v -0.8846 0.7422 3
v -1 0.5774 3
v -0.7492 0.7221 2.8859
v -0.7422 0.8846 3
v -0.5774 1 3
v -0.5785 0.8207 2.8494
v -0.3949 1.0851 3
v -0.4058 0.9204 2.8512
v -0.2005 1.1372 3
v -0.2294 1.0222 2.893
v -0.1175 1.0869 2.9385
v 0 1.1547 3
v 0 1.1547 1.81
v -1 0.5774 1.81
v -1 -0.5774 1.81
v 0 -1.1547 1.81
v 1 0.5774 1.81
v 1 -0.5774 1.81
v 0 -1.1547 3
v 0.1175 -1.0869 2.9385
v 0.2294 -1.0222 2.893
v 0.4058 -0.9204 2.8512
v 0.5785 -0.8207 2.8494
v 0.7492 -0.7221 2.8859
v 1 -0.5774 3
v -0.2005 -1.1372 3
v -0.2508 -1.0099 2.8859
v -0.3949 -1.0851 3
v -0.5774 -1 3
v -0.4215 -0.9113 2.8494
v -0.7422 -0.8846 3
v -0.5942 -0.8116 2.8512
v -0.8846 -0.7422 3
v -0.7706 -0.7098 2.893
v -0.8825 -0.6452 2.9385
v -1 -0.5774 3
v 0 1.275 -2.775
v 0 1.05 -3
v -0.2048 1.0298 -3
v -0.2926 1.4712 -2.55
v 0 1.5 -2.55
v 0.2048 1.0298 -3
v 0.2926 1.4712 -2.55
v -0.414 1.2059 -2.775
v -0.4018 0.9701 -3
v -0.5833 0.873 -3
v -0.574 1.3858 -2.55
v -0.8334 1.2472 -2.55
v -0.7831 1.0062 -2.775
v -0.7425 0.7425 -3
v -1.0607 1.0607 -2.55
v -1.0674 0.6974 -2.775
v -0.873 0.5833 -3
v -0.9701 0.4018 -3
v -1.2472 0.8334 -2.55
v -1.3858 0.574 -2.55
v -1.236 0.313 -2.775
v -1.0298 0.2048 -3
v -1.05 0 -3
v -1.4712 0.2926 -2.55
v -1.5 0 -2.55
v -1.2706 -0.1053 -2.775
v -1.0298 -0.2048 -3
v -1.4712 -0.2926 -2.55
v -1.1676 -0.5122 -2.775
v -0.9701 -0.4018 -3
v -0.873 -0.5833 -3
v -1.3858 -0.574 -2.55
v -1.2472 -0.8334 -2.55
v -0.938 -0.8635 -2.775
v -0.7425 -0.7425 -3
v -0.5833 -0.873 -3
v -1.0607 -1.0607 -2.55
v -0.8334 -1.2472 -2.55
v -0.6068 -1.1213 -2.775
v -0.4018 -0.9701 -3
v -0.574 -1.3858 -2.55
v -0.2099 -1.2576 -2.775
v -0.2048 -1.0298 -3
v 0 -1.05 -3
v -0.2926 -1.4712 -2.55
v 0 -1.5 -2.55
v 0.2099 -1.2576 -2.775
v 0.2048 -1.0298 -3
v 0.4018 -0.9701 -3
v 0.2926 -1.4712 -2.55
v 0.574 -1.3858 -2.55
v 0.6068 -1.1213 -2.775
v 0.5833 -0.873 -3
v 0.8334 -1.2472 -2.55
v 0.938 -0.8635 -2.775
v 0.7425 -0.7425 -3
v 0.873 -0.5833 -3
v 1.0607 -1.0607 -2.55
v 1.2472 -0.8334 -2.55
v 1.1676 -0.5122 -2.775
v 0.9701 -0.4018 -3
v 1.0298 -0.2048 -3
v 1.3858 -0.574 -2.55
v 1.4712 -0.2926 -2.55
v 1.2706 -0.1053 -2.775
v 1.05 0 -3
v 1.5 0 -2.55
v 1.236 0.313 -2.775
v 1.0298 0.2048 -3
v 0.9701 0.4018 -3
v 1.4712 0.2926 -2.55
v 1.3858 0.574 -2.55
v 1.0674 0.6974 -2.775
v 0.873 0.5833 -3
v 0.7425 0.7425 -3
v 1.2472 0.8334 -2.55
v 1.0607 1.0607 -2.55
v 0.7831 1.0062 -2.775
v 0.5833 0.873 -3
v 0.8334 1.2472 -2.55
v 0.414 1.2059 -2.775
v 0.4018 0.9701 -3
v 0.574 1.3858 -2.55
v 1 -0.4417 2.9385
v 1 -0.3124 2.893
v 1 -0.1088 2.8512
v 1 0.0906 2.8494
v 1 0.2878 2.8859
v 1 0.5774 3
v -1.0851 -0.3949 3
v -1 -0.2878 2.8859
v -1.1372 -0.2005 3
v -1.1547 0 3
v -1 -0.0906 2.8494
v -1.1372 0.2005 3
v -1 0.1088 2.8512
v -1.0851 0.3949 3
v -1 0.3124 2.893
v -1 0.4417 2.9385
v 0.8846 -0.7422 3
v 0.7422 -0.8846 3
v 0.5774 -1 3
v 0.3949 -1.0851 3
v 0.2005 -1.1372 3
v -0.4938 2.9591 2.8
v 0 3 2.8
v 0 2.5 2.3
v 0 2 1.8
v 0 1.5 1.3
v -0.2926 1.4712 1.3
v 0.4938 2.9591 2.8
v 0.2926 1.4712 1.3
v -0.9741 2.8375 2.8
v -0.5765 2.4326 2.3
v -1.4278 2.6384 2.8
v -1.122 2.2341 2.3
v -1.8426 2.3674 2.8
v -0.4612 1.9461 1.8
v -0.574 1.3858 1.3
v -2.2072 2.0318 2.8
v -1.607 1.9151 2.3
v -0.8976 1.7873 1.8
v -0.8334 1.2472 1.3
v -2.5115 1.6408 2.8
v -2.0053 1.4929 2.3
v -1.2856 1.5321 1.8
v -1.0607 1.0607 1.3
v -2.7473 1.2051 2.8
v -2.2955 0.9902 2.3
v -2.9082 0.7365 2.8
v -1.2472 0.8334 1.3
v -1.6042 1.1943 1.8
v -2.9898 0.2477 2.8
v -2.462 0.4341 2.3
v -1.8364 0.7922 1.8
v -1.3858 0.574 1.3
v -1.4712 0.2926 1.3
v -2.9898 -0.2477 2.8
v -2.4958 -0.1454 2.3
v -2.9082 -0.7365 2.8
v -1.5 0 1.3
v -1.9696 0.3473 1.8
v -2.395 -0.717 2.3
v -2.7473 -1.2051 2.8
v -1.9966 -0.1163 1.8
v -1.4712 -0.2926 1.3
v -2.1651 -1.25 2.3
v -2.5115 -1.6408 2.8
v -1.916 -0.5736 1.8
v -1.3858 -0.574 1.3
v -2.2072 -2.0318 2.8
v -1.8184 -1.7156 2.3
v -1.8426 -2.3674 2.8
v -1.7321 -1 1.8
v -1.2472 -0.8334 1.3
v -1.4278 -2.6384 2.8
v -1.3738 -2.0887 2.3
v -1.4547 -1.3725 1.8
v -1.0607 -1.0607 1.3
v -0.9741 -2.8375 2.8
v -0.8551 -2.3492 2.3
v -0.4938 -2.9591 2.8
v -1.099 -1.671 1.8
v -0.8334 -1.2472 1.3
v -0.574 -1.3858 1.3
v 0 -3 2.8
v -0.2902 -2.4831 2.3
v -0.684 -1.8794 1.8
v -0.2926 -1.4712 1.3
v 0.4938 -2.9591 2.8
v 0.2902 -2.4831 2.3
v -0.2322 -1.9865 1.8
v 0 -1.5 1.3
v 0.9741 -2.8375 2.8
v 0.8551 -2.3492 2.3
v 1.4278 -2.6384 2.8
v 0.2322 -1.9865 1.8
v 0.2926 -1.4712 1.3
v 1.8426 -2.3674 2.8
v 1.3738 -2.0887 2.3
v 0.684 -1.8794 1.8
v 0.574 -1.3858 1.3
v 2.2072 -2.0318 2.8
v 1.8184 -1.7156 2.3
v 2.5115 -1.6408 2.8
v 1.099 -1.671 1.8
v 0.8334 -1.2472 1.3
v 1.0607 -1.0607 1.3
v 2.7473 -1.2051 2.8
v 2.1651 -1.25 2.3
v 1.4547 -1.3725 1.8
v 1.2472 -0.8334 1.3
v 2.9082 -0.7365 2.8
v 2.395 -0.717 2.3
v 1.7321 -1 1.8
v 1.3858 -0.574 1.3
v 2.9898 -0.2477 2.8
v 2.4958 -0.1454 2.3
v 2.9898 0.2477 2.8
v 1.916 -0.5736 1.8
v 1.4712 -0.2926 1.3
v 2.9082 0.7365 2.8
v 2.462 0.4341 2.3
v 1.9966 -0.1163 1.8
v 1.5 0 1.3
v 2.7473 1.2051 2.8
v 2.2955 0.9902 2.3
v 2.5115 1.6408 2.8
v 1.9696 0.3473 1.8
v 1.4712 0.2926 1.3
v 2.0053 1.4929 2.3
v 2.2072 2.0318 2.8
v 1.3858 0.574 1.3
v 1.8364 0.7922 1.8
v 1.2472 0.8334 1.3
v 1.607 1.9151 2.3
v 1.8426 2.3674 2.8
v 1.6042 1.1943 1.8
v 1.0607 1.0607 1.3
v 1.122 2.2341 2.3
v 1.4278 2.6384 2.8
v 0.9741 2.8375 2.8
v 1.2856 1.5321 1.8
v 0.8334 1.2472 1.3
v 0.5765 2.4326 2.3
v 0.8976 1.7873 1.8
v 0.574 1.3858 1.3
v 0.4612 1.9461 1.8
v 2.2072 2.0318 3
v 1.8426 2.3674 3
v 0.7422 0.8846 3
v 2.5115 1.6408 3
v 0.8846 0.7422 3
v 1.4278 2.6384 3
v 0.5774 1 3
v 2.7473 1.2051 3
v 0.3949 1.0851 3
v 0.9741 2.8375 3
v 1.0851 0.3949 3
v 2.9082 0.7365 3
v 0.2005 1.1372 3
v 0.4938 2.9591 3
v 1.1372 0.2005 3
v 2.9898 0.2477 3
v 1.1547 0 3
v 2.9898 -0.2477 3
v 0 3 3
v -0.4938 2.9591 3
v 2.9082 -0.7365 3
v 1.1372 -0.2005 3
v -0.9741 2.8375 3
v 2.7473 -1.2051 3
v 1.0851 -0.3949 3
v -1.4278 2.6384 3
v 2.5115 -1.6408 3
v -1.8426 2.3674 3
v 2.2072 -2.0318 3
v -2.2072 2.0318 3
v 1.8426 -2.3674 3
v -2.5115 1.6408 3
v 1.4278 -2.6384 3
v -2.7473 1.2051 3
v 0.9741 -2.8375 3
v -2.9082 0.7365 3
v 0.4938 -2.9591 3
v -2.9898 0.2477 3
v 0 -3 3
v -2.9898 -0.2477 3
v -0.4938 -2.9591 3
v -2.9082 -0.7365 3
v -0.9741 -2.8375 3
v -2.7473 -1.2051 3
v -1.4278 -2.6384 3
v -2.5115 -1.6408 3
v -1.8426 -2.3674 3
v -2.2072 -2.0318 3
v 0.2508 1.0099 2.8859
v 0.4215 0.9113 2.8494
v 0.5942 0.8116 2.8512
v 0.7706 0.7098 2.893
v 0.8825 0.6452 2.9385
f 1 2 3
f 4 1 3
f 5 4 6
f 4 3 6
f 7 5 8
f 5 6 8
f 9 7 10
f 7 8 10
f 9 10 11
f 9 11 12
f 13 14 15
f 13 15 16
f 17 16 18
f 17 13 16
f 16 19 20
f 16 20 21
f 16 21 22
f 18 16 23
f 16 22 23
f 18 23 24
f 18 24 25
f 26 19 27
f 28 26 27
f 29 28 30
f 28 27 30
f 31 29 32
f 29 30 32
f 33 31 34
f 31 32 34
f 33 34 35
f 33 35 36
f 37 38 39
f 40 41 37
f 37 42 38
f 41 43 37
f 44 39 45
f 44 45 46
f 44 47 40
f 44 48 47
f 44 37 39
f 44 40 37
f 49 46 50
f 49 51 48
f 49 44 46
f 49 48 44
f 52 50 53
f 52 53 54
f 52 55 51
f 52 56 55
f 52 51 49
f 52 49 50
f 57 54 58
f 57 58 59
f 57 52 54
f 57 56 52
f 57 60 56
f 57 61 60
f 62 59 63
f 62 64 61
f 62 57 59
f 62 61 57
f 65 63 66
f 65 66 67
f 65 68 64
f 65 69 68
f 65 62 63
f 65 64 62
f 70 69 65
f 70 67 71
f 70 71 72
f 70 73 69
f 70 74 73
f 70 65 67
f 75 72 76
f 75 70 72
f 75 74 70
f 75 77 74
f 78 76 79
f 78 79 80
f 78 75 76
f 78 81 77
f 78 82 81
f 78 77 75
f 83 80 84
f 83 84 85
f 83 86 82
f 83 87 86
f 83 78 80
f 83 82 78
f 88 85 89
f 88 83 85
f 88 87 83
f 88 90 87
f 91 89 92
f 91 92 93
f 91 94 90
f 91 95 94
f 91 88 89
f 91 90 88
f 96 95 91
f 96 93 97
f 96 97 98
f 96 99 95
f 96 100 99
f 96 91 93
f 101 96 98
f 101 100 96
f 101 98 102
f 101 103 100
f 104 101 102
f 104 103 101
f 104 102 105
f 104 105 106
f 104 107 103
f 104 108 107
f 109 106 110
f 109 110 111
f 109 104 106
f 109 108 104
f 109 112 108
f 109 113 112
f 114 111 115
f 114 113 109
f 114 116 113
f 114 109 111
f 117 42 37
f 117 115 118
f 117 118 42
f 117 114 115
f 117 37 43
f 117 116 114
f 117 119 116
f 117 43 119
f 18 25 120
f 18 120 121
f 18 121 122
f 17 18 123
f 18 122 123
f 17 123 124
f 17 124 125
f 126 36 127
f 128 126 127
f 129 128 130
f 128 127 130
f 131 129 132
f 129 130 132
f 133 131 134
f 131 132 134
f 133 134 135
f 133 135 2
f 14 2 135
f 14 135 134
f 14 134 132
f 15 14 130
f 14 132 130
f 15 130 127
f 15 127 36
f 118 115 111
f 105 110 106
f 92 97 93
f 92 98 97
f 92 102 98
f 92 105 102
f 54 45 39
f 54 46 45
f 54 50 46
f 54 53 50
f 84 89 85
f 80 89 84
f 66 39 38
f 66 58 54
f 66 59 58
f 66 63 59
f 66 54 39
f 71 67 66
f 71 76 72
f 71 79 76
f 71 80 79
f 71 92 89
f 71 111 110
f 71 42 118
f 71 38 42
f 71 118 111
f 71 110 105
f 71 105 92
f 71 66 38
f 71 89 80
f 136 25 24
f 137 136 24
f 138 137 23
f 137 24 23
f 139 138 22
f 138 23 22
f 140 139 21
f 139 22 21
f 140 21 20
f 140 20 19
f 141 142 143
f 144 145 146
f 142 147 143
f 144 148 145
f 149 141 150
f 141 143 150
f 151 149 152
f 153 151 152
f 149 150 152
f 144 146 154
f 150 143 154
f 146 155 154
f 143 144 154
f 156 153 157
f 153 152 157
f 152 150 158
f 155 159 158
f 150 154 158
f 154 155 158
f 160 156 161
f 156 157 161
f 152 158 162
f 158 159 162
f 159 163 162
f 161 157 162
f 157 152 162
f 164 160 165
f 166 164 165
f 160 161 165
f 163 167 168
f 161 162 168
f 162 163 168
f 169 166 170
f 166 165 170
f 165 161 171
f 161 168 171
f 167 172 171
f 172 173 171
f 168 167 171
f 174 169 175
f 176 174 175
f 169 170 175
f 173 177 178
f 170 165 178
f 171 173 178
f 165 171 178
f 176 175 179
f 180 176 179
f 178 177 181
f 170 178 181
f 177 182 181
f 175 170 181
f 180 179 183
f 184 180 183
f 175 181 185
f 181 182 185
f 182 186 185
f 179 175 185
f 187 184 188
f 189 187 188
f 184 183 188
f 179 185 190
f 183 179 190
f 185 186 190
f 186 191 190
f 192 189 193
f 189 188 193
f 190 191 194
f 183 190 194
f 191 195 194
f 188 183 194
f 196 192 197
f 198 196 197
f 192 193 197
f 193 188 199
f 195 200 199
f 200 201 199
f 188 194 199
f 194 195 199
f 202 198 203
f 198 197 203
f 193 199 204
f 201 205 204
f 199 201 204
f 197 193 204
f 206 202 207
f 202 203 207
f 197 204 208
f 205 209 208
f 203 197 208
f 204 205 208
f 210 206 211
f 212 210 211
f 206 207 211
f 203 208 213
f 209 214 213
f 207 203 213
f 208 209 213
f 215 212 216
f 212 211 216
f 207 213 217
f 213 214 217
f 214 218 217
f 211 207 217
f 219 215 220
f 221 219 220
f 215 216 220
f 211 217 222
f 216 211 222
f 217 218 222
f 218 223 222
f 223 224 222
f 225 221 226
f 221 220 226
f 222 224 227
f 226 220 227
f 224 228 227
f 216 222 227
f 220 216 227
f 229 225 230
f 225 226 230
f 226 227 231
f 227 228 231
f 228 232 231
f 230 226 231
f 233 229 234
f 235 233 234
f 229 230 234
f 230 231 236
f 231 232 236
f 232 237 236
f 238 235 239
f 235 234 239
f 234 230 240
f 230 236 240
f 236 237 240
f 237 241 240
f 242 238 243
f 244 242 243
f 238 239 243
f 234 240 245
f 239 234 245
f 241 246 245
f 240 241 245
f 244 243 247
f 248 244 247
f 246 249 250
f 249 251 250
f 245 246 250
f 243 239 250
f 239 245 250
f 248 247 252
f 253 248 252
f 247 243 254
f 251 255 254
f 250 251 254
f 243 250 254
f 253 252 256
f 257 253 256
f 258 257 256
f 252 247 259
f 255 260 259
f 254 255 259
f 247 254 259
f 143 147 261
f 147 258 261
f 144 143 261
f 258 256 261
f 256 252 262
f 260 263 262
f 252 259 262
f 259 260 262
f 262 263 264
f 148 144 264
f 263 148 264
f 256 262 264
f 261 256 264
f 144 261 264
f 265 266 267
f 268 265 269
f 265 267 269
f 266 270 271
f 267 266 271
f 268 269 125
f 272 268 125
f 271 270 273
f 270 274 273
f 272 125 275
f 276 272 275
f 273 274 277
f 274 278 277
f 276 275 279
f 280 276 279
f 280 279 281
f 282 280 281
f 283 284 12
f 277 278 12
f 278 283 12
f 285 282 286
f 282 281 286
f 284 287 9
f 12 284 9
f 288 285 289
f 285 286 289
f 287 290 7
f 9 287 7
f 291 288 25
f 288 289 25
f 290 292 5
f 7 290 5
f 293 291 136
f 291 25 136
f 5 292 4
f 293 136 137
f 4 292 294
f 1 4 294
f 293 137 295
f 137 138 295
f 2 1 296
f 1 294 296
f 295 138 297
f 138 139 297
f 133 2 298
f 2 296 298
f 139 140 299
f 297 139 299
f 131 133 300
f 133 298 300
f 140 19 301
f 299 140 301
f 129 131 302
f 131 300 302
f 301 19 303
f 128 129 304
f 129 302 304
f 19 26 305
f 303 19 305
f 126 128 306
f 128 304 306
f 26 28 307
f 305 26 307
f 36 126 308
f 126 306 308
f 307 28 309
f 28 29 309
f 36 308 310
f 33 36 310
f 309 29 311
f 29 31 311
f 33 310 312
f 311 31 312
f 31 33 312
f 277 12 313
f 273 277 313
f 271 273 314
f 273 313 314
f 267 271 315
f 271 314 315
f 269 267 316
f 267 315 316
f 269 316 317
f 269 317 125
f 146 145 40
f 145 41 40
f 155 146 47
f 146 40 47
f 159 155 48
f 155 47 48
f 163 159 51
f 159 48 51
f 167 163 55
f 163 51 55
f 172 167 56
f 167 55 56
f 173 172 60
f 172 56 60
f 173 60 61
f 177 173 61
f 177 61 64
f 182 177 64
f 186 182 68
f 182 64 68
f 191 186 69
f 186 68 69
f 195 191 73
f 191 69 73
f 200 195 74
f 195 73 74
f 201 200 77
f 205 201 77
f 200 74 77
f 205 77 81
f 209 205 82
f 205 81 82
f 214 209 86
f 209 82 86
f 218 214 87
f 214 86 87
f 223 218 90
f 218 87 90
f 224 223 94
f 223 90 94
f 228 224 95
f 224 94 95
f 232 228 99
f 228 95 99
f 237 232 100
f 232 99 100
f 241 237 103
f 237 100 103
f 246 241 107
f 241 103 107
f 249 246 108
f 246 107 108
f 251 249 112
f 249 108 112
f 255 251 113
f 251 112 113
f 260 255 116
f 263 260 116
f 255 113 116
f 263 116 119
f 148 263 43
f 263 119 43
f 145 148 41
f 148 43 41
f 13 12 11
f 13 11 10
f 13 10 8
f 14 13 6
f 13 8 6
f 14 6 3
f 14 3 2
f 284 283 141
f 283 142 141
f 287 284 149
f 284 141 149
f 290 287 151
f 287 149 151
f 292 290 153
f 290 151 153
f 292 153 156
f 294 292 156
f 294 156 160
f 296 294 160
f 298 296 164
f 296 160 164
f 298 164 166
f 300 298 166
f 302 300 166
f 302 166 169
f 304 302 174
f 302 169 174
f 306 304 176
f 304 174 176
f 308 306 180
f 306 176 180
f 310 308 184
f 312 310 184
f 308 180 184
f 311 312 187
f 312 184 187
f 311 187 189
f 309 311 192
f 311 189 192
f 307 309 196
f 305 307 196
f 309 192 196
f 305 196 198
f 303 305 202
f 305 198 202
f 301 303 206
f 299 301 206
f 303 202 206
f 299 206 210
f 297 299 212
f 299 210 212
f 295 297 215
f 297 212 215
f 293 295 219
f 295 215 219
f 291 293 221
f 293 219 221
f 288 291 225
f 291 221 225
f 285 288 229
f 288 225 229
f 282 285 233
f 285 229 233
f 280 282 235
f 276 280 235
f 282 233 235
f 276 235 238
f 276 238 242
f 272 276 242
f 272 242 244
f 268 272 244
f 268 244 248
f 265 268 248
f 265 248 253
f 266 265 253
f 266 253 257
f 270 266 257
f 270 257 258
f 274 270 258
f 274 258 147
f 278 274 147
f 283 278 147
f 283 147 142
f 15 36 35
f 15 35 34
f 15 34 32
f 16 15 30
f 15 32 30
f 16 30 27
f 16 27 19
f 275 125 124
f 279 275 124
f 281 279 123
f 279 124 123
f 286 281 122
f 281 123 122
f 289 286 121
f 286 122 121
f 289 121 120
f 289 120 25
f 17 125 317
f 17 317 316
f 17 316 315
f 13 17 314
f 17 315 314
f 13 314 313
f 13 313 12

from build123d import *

# Parameters (mm, degrees)
SKETCH3_W          = 6
SKETCH3_H          = 1.5
CHAMFER1_SIZE      = 0.45
CUT_EXTRUDE1_DEPTH = 1.19


with BuildPart() as part:
    # Sketch3 → Revolve1 (revolve)
    with BuildSketch(Plane(origin=(0, 0, 0), x_dir=(0, 0, -1), z_dir=(1, 0, 0))):
        with Locations((0, 0.75)):
            Rectangle(SKETCH3_W, SKETCH3_H)
    revolve(axis=Axis((0, 0, -3), (0, 0, 1)))

    # Chamfer1
    chamfer1_edges = [part.edges().sort_by_distance(p)[0] for p in [
        (0, -1.5, -3),
    ]]
    chamfer(chamfer1_edges, length=CHAMFER1_SIZE)

    # Sketch6 → Revolve2 (revolve)
    with BuildSketch(Plane(origin=(0, 0, 0), x_dir=(0, 0, -1), z_dir=(1, 0, 0))):
        Polygon((-3, 3), (-2.8, 3), (-1.3, 1.5), (-1.3, 0), (-3, 0), align=None)
    revolve(axis=Axis((0, 0, -3), (0, 0, 1)))

    # Sketch8 → Cut-Extrude1 (cut)
    with BuildSketch(Plane.XY.offset(3)):
        Polygon((0, 1.154700538), (-1, 0.577350269), (-1, -0.577350269), (0, -1.154700538), (1, -0.577350269), (1, 0.577350269), align=None)
    extrude(amount=-CUT_EXTRUDE1_DEPTH, mode=Mode.SUBTRACT)

    # Cut-Extrude2 cone 1 section (through the dimple's axis) → Cut-Extrude2 (revolve, cut)
    with BuildSketch(Plane(origin=(0, 0, 3), x_dir=(0, -1, 0), z_dir=(1, 0, 0))):
        Polygon((0, 0), (1.154700538, 0), (0, 1.154700538), align=None)
    revolve(axis=Axis((0, 0, 3), (0, 0, -1)), mode=Mode.SUBTRACT)


solid = part.part
